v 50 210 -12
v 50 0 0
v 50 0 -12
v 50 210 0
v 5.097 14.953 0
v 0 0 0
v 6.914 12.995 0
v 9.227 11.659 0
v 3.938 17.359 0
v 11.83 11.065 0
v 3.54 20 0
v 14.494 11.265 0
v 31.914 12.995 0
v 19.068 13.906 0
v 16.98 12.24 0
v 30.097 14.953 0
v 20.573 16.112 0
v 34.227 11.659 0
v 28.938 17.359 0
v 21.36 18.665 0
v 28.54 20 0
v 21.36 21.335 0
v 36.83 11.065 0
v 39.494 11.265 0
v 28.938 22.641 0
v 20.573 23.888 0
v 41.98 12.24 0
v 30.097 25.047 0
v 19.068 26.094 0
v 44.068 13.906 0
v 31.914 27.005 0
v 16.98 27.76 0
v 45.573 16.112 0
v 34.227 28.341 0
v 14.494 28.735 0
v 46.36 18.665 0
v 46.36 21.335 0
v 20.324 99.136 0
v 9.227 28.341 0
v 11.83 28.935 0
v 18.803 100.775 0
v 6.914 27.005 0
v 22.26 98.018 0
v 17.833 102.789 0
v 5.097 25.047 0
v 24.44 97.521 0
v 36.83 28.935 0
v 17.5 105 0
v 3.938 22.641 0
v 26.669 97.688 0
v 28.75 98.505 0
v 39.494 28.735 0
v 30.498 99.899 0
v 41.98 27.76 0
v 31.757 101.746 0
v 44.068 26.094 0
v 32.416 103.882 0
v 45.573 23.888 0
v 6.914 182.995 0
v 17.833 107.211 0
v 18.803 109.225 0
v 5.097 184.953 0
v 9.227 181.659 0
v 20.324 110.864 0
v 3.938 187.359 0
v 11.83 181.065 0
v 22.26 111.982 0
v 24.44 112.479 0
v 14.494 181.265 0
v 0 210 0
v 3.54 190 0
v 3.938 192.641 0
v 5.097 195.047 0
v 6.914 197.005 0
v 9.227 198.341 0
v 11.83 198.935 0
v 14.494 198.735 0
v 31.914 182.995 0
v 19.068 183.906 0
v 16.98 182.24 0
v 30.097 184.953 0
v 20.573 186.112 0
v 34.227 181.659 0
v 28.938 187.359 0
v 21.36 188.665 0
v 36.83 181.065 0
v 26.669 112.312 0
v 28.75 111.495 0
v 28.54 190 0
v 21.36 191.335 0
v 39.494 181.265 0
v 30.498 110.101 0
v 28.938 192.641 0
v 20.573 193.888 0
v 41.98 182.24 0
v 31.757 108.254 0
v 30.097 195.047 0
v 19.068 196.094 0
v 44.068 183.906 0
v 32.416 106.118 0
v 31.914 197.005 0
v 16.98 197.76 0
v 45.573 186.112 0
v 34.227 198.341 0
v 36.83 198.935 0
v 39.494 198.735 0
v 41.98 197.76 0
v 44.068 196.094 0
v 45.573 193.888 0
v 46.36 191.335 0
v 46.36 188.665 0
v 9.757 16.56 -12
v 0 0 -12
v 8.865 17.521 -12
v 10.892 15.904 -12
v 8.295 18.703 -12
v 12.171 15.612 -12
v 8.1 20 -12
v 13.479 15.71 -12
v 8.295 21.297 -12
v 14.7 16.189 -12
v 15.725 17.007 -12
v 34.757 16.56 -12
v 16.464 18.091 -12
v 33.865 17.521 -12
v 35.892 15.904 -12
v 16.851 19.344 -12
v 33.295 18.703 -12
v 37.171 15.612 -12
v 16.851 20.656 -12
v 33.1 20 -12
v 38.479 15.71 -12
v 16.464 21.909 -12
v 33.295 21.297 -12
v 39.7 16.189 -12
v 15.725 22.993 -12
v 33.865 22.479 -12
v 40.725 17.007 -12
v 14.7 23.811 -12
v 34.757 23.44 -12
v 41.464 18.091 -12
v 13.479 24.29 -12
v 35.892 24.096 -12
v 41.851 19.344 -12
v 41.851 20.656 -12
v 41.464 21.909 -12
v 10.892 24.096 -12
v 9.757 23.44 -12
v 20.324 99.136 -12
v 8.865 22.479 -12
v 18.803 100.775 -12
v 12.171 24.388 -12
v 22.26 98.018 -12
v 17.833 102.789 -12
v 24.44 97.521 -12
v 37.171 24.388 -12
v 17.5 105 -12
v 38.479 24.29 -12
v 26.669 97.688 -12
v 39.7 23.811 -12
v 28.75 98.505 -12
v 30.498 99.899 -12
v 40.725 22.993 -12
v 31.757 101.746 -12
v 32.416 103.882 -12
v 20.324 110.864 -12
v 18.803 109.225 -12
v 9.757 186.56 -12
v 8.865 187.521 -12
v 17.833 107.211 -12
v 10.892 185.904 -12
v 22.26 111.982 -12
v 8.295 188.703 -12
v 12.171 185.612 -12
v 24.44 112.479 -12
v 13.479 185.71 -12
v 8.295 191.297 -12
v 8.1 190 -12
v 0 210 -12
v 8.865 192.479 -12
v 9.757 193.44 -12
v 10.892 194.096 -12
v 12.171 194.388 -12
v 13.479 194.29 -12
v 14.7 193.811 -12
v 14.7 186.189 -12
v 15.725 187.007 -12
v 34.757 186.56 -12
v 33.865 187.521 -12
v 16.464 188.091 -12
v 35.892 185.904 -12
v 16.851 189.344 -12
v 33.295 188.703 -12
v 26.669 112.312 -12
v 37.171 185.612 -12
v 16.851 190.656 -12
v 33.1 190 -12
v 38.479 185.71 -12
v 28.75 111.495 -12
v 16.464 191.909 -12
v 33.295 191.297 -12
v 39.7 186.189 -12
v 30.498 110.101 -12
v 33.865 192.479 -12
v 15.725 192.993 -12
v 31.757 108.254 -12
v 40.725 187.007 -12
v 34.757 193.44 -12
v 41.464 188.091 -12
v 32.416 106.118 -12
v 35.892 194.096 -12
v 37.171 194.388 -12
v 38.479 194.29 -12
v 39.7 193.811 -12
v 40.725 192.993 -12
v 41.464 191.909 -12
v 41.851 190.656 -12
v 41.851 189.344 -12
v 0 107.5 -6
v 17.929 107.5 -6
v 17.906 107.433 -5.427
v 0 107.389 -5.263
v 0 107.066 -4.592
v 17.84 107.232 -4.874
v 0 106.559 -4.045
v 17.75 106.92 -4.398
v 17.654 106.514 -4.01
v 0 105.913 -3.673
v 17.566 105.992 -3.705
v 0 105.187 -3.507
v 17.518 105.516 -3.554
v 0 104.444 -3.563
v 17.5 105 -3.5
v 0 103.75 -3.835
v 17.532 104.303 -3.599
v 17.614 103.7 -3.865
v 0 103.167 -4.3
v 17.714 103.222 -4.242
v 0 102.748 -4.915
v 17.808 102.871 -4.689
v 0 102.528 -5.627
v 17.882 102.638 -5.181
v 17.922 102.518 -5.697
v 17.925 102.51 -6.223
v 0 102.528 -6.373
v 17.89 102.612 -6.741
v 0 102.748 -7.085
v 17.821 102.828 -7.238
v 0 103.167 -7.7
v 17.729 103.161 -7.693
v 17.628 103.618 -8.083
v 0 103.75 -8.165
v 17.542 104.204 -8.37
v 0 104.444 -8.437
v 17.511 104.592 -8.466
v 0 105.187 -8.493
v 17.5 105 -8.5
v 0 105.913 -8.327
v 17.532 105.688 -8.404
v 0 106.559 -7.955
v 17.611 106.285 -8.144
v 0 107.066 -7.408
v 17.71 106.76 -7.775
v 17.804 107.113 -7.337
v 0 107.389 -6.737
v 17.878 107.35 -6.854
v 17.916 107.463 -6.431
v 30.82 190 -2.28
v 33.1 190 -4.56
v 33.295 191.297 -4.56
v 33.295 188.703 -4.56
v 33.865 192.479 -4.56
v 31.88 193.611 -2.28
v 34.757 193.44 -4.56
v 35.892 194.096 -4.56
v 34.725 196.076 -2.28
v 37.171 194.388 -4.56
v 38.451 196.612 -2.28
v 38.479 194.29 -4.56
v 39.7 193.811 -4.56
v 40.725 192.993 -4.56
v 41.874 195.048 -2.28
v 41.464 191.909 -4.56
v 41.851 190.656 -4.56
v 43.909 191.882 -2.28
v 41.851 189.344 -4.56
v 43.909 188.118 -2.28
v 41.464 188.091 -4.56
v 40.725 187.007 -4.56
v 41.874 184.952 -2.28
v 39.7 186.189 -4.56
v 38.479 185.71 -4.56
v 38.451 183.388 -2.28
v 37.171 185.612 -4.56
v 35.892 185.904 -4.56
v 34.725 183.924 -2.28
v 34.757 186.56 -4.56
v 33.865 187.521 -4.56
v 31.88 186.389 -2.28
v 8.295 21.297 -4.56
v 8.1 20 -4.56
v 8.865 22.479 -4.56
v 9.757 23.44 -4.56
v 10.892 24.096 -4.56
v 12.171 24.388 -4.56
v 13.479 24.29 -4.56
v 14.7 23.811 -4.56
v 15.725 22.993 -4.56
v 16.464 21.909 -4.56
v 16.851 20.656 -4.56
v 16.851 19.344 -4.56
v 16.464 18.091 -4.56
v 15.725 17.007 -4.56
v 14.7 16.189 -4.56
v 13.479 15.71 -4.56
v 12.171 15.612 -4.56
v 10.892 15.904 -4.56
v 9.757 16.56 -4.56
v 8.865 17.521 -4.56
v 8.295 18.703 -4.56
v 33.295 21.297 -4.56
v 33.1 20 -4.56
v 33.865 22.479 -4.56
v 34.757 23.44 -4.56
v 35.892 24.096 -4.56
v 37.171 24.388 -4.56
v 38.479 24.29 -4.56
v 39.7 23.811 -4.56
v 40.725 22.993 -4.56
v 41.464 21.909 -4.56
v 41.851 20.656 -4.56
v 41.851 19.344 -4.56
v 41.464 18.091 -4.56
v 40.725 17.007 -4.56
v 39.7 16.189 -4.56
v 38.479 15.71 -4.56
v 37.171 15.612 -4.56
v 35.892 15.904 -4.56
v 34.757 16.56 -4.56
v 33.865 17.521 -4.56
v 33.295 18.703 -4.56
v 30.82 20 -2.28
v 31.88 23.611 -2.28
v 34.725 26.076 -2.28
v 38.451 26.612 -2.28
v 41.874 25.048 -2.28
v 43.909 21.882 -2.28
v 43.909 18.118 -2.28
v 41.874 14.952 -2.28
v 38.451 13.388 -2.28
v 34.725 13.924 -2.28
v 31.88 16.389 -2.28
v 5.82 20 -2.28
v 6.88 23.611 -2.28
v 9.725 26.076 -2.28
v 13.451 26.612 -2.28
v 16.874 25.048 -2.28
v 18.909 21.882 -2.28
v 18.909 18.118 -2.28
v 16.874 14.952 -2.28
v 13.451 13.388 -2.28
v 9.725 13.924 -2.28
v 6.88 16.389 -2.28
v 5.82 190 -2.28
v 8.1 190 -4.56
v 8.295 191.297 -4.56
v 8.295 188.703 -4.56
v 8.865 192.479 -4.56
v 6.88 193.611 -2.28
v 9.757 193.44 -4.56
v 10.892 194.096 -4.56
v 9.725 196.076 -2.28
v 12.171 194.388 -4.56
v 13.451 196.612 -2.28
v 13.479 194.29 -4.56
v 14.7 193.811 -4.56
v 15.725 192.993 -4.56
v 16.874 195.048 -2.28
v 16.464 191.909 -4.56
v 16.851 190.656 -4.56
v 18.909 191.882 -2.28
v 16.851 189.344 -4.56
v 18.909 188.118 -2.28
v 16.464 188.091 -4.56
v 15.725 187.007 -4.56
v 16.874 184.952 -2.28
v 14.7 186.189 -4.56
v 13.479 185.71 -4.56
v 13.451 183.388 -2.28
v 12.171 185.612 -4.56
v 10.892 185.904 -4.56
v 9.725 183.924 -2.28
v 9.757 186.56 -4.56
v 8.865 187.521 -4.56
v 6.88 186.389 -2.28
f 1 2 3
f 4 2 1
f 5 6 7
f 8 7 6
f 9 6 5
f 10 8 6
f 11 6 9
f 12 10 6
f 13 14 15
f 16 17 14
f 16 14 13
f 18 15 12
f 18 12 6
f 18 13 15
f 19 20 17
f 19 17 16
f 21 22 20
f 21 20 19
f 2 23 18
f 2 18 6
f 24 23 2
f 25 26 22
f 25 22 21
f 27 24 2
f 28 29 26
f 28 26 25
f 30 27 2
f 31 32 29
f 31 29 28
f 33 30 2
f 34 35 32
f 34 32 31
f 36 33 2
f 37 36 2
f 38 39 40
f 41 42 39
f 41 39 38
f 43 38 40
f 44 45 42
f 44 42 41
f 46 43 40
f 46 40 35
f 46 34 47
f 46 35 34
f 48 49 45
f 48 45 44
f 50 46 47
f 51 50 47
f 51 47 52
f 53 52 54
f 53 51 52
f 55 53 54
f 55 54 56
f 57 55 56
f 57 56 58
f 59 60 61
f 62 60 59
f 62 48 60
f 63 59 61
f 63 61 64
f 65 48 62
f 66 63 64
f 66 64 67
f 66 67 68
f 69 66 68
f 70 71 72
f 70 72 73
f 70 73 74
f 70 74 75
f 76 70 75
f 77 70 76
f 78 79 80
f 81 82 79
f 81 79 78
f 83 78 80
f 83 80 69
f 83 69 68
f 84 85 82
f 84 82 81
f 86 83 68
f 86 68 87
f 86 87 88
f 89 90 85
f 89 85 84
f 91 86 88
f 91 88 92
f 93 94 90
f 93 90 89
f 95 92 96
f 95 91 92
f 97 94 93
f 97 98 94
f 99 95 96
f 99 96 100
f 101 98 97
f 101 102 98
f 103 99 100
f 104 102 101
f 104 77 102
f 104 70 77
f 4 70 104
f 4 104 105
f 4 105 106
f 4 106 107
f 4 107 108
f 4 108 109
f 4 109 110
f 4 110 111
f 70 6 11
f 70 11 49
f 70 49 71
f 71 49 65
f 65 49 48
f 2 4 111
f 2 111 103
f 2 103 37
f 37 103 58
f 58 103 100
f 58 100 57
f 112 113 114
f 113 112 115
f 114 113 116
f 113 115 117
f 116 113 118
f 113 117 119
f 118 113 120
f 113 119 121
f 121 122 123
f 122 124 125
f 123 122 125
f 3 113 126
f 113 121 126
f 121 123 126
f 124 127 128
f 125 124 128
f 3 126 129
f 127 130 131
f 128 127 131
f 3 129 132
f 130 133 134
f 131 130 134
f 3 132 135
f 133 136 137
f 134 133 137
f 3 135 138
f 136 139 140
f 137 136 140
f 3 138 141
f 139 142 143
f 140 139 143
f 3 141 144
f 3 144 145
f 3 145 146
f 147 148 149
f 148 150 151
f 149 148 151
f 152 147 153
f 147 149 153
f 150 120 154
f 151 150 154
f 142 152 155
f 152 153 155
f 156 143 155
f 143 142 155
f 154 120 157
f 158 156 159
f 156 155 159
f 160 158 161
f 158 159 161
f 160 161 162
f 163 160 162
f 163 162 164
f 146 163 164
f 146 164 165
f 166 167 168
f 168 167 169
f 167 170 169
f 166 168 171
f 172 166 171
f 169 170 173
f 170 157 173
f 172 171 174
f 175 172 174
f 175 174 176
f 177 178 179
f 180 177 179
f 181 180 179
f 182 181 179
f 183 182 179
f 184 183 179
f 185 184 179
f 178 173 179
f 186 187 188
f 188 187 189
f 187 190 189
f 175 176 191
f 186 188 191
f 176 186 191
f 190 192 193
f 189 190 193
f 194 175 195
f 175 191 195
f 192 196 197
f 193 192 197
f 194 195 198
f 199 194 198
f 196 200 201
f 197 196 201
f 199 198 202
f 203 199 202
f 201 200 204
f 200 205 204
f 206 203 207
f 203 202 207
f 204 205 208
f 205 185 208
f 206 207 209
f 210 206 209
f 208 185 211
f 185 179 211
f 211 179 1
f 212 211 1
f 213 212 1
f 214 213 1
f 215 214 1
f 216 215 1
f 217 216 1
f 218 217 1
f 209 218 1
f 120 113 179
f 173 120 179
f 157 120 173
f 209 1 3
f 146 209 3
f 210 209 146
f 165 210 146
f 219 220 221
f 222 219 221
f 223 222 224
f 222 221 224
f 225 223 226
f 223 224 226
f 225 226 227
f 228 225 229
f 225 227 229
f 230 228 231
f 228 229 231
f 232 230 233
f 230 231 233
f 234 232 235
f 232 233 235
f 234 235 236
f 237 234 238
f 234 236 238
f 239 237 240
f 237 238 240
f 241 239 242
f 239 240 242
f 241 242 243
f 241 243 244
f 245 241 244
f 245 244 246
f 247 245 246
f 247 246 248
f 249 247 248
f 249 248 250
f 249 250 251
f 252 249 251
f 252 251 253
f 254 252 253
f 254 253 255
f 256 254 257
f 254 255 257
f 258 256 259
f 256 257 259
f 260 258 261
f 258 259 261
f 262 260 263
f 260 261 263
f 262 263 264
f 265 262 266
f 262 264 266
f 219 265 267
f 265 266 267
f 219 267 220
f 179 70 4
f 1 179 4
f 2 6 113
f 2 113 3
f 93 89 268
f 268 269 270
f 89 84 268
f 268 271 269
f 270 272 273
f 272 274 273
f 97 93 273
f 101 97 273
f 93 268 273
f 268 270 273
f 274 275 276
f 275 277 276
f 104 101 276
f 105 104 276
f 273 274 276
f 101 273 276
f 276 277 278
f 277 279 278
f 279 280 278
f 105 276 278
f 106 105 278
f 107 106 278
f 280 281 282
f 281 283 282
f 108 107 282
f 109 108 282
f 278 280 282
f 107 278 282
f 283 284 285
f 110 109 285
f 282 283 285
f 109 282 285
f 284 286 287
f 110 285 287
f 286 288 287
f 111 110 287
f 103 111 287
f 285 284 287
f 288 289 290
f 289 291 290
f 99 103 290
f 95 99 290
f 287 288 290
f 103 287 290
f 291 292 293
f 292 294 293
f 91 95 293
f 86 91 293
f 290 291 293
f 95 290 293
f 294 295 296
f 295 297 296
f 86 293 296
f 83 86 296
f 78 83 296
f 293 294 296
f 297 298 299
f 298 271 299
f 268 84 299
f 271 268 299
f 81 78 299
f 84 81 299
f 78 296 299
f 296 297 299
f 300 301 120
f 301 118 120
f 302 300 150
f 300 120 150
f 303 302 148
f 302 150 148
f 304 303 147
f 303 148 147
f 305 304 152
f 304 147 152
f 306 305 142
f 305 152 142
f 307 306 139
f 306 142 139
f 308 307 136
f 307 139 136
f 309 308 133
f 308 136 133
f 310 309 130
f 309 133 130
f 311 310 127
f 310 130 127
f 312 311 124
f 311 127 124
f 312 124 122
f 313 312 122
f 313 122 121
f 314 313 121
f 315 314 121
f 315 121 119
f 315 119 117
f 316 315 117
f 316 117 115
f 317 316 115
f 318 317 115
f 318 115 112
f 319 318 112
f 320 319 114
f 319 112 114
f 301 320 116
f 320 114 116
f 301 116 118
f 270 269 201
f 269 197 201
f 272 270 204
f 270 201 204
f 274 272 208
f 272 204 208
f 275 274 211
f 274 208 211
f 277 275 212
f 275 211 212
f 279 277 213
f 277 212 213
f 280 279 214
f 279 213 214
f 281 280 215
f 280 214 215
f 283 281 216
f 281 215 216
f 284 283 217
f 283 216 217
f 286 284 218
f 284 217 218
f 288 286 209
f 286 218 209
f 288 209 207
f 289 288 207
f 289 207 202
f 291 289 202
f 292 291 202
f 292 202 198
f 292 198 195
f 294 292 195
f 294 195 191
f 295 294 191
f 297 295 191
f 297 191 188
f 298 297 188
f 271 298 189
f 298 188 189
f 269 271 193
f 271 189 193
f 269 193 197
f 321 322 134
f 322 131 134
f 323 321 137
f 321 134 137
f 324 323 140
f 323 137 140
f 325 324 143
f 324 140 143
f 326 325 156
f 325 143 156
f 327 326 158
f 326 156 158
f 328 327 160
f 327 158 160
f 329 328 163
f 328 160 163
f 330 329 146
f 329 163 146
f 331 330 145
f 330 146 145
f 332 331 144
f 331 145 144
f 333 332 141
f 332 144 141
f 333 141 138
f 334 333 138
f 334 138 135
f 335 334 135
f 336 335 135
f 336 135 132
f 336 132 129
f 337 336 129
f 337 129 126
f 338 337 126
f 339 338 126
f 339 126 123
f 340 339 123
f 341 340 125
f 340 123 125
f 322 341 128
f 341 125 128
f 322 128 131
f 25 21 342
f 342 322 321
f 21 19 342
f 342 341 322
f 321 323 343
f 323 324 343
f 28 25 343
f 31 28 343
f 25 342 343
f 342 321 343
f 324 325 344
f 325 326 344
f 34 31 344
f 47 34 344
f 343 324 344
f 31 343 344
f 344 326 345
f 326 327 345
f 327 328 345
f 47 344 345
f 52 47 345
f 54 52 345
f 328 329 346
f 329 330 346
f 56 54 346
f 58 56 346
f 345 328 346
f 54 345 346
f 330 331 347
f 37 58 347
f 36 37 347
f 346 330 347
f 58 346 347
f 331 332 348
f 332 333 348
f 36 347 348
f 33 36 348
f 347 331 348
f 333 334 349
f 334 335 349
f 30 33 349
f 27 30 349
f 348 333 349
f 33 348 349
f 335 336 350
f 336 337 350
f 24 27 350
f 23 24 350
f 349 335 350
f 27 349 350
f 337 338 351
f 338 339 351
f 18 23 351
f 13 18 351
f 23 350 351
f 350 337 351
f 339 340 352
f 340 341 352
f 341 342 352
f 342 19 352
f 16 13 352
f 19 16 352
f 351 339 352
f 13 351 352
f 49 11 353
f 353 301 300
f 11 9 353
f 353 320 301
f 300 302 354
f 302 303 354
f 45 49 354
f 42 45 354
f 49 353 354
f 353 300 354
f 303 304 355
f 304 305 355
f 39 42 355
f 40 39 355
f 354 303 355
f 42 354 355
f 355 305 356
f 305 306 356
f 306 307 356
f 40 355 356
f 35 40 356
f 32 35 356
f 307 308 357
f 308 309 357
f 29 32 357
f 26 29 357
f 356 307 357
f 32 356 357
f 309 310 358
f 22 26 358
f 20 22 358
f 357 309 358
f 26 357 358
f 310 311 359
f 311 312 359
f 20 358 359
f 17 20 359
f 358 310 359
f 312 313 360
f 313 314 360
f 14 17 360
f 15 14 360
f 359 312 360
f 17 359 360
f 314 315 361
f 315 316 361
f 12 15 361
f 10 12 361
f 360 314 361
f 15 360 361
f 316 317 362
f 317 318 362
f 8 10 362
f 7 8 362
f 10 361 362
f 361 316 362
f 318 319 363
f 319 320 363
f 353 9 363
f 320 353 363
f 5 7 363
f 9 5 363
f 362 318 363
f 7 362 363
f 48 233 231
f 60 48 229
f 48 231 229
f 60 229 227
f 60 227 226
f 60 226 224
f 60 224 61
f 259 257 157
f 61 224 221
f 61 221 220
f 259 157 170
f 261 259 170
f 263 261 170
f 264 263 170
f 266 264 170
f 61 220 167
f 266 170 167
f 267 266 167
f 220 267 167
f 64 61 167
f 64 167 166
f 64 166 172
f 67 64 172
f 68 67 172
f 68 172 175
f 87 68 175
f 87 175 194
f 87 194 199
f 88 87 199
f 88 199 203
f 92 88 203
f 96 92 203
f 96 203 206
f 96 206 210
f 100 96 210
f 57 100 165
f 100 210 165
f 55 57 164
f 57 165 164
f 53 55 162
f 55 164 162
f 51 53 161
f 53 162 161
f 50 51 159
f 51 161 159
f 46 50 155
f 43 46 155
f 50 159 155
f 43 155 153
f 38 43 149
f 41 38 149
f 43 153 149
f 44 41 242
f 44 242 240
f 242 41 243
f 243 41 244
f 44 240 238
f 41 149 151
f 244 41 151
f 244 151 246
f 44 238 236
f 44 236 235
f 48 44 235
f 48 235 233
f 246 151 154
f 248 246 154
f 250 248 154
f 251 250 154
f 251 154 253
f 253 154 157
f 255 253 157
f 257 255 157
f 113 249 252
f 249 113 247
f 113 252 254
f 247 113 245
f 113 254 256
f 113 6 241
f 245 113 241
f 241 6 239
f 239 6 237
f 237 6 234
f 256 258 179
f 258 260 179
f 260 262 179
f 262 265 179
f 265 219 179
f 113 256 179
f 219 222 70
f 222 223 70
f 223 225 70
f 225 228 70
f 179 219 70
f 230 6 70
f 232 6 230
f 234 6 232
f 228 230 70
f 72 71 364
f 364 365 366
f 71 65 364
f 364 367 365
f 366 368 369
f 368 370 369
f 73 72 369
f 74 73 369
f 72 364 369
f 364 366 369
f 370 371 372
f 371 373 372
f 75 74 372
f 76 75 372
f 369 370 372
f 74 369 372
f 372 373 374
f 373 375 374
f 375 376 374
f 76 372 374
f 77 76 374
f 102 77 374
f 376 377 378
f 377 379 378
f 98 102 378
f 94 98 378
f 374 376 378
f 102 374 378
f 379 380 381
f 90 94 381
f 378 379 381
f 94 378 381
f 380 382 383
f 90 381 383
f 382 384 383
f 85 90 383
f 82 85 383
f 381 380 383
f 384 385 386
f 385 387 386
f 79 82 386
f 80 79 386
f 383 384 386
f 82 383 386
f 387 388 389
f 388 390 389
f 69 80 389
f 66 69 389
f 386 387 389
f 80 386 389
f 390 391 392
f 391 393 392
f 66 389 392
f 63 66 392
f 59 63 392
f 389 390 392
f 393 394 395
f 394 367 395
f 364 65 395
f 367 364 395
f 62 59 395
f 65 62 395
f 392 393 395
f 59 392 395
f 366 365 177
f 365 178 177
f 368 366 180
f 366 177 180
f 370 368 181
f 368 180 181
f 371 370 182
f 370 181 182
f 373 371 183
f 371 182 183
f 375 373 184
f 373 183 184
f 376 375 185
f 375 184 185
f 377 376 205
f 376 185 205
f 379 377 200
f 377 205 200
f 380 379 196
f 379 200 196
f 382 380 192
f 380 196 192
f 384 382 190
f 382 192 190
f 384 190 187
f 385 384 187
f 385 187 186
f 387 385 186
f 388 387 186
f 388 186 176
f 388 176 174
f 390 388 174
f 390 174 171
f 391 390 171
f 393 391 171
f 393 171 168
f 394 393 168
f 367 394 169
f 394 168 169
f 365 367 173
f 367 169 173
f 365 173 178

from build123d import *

# Parameters (mm, degrees)
F0_W           = 50
F0_H           = 210
F1_DEPTH       = 12
F3_D           = 8.8
F3_CSINK_D     = 17.92
F3_CSINK_ANGLE = 90
F5_D           = 15
F7_D           = 5
F7_DEPTH       = 20
F7_TIP         = 1.5021515476


with BuildPart() as f1:
    # F0 (on Top) → F1 (new body)
    with BuildSketch(Plane.XY):
        with Locations((25, 105)):
            Rectangle(F0_W, F0_H)
    extrude(amount=-F1_DEPTH)

    # F3 (through all)
    with Locations(Plane.XY):
        with Locations((12.5, 20), (37.5, 20), (37.5, 190), (12.5, 190)):
            CounterSinkHole(F3_D / 2, F3_CSINK_D / 2, counter_sink_angle=F3_CSINK_ANGLE)

    # F5 (through all)
    with Locations(Plane.XY):
        with Locations((25, 105)):
            Hole(F5_D / 2)

    # F7
    with Locations(Plane(origin=(0, 0, 0), x_dir=(0, -1, 0), z_dir=(-1, 0, 0))):
        with Locations((-105, -6)):
            Hole(F7_D / 2, depth=F7_DEPTH)
            with Locations((0, 0, -(F7_DEPTH + F7_TIP / 2))):  # 118° drill point
                Cone(0, F7_D / 2, F7_TIP, mode=Mode.SUBTRACT)


solid = f1.part
